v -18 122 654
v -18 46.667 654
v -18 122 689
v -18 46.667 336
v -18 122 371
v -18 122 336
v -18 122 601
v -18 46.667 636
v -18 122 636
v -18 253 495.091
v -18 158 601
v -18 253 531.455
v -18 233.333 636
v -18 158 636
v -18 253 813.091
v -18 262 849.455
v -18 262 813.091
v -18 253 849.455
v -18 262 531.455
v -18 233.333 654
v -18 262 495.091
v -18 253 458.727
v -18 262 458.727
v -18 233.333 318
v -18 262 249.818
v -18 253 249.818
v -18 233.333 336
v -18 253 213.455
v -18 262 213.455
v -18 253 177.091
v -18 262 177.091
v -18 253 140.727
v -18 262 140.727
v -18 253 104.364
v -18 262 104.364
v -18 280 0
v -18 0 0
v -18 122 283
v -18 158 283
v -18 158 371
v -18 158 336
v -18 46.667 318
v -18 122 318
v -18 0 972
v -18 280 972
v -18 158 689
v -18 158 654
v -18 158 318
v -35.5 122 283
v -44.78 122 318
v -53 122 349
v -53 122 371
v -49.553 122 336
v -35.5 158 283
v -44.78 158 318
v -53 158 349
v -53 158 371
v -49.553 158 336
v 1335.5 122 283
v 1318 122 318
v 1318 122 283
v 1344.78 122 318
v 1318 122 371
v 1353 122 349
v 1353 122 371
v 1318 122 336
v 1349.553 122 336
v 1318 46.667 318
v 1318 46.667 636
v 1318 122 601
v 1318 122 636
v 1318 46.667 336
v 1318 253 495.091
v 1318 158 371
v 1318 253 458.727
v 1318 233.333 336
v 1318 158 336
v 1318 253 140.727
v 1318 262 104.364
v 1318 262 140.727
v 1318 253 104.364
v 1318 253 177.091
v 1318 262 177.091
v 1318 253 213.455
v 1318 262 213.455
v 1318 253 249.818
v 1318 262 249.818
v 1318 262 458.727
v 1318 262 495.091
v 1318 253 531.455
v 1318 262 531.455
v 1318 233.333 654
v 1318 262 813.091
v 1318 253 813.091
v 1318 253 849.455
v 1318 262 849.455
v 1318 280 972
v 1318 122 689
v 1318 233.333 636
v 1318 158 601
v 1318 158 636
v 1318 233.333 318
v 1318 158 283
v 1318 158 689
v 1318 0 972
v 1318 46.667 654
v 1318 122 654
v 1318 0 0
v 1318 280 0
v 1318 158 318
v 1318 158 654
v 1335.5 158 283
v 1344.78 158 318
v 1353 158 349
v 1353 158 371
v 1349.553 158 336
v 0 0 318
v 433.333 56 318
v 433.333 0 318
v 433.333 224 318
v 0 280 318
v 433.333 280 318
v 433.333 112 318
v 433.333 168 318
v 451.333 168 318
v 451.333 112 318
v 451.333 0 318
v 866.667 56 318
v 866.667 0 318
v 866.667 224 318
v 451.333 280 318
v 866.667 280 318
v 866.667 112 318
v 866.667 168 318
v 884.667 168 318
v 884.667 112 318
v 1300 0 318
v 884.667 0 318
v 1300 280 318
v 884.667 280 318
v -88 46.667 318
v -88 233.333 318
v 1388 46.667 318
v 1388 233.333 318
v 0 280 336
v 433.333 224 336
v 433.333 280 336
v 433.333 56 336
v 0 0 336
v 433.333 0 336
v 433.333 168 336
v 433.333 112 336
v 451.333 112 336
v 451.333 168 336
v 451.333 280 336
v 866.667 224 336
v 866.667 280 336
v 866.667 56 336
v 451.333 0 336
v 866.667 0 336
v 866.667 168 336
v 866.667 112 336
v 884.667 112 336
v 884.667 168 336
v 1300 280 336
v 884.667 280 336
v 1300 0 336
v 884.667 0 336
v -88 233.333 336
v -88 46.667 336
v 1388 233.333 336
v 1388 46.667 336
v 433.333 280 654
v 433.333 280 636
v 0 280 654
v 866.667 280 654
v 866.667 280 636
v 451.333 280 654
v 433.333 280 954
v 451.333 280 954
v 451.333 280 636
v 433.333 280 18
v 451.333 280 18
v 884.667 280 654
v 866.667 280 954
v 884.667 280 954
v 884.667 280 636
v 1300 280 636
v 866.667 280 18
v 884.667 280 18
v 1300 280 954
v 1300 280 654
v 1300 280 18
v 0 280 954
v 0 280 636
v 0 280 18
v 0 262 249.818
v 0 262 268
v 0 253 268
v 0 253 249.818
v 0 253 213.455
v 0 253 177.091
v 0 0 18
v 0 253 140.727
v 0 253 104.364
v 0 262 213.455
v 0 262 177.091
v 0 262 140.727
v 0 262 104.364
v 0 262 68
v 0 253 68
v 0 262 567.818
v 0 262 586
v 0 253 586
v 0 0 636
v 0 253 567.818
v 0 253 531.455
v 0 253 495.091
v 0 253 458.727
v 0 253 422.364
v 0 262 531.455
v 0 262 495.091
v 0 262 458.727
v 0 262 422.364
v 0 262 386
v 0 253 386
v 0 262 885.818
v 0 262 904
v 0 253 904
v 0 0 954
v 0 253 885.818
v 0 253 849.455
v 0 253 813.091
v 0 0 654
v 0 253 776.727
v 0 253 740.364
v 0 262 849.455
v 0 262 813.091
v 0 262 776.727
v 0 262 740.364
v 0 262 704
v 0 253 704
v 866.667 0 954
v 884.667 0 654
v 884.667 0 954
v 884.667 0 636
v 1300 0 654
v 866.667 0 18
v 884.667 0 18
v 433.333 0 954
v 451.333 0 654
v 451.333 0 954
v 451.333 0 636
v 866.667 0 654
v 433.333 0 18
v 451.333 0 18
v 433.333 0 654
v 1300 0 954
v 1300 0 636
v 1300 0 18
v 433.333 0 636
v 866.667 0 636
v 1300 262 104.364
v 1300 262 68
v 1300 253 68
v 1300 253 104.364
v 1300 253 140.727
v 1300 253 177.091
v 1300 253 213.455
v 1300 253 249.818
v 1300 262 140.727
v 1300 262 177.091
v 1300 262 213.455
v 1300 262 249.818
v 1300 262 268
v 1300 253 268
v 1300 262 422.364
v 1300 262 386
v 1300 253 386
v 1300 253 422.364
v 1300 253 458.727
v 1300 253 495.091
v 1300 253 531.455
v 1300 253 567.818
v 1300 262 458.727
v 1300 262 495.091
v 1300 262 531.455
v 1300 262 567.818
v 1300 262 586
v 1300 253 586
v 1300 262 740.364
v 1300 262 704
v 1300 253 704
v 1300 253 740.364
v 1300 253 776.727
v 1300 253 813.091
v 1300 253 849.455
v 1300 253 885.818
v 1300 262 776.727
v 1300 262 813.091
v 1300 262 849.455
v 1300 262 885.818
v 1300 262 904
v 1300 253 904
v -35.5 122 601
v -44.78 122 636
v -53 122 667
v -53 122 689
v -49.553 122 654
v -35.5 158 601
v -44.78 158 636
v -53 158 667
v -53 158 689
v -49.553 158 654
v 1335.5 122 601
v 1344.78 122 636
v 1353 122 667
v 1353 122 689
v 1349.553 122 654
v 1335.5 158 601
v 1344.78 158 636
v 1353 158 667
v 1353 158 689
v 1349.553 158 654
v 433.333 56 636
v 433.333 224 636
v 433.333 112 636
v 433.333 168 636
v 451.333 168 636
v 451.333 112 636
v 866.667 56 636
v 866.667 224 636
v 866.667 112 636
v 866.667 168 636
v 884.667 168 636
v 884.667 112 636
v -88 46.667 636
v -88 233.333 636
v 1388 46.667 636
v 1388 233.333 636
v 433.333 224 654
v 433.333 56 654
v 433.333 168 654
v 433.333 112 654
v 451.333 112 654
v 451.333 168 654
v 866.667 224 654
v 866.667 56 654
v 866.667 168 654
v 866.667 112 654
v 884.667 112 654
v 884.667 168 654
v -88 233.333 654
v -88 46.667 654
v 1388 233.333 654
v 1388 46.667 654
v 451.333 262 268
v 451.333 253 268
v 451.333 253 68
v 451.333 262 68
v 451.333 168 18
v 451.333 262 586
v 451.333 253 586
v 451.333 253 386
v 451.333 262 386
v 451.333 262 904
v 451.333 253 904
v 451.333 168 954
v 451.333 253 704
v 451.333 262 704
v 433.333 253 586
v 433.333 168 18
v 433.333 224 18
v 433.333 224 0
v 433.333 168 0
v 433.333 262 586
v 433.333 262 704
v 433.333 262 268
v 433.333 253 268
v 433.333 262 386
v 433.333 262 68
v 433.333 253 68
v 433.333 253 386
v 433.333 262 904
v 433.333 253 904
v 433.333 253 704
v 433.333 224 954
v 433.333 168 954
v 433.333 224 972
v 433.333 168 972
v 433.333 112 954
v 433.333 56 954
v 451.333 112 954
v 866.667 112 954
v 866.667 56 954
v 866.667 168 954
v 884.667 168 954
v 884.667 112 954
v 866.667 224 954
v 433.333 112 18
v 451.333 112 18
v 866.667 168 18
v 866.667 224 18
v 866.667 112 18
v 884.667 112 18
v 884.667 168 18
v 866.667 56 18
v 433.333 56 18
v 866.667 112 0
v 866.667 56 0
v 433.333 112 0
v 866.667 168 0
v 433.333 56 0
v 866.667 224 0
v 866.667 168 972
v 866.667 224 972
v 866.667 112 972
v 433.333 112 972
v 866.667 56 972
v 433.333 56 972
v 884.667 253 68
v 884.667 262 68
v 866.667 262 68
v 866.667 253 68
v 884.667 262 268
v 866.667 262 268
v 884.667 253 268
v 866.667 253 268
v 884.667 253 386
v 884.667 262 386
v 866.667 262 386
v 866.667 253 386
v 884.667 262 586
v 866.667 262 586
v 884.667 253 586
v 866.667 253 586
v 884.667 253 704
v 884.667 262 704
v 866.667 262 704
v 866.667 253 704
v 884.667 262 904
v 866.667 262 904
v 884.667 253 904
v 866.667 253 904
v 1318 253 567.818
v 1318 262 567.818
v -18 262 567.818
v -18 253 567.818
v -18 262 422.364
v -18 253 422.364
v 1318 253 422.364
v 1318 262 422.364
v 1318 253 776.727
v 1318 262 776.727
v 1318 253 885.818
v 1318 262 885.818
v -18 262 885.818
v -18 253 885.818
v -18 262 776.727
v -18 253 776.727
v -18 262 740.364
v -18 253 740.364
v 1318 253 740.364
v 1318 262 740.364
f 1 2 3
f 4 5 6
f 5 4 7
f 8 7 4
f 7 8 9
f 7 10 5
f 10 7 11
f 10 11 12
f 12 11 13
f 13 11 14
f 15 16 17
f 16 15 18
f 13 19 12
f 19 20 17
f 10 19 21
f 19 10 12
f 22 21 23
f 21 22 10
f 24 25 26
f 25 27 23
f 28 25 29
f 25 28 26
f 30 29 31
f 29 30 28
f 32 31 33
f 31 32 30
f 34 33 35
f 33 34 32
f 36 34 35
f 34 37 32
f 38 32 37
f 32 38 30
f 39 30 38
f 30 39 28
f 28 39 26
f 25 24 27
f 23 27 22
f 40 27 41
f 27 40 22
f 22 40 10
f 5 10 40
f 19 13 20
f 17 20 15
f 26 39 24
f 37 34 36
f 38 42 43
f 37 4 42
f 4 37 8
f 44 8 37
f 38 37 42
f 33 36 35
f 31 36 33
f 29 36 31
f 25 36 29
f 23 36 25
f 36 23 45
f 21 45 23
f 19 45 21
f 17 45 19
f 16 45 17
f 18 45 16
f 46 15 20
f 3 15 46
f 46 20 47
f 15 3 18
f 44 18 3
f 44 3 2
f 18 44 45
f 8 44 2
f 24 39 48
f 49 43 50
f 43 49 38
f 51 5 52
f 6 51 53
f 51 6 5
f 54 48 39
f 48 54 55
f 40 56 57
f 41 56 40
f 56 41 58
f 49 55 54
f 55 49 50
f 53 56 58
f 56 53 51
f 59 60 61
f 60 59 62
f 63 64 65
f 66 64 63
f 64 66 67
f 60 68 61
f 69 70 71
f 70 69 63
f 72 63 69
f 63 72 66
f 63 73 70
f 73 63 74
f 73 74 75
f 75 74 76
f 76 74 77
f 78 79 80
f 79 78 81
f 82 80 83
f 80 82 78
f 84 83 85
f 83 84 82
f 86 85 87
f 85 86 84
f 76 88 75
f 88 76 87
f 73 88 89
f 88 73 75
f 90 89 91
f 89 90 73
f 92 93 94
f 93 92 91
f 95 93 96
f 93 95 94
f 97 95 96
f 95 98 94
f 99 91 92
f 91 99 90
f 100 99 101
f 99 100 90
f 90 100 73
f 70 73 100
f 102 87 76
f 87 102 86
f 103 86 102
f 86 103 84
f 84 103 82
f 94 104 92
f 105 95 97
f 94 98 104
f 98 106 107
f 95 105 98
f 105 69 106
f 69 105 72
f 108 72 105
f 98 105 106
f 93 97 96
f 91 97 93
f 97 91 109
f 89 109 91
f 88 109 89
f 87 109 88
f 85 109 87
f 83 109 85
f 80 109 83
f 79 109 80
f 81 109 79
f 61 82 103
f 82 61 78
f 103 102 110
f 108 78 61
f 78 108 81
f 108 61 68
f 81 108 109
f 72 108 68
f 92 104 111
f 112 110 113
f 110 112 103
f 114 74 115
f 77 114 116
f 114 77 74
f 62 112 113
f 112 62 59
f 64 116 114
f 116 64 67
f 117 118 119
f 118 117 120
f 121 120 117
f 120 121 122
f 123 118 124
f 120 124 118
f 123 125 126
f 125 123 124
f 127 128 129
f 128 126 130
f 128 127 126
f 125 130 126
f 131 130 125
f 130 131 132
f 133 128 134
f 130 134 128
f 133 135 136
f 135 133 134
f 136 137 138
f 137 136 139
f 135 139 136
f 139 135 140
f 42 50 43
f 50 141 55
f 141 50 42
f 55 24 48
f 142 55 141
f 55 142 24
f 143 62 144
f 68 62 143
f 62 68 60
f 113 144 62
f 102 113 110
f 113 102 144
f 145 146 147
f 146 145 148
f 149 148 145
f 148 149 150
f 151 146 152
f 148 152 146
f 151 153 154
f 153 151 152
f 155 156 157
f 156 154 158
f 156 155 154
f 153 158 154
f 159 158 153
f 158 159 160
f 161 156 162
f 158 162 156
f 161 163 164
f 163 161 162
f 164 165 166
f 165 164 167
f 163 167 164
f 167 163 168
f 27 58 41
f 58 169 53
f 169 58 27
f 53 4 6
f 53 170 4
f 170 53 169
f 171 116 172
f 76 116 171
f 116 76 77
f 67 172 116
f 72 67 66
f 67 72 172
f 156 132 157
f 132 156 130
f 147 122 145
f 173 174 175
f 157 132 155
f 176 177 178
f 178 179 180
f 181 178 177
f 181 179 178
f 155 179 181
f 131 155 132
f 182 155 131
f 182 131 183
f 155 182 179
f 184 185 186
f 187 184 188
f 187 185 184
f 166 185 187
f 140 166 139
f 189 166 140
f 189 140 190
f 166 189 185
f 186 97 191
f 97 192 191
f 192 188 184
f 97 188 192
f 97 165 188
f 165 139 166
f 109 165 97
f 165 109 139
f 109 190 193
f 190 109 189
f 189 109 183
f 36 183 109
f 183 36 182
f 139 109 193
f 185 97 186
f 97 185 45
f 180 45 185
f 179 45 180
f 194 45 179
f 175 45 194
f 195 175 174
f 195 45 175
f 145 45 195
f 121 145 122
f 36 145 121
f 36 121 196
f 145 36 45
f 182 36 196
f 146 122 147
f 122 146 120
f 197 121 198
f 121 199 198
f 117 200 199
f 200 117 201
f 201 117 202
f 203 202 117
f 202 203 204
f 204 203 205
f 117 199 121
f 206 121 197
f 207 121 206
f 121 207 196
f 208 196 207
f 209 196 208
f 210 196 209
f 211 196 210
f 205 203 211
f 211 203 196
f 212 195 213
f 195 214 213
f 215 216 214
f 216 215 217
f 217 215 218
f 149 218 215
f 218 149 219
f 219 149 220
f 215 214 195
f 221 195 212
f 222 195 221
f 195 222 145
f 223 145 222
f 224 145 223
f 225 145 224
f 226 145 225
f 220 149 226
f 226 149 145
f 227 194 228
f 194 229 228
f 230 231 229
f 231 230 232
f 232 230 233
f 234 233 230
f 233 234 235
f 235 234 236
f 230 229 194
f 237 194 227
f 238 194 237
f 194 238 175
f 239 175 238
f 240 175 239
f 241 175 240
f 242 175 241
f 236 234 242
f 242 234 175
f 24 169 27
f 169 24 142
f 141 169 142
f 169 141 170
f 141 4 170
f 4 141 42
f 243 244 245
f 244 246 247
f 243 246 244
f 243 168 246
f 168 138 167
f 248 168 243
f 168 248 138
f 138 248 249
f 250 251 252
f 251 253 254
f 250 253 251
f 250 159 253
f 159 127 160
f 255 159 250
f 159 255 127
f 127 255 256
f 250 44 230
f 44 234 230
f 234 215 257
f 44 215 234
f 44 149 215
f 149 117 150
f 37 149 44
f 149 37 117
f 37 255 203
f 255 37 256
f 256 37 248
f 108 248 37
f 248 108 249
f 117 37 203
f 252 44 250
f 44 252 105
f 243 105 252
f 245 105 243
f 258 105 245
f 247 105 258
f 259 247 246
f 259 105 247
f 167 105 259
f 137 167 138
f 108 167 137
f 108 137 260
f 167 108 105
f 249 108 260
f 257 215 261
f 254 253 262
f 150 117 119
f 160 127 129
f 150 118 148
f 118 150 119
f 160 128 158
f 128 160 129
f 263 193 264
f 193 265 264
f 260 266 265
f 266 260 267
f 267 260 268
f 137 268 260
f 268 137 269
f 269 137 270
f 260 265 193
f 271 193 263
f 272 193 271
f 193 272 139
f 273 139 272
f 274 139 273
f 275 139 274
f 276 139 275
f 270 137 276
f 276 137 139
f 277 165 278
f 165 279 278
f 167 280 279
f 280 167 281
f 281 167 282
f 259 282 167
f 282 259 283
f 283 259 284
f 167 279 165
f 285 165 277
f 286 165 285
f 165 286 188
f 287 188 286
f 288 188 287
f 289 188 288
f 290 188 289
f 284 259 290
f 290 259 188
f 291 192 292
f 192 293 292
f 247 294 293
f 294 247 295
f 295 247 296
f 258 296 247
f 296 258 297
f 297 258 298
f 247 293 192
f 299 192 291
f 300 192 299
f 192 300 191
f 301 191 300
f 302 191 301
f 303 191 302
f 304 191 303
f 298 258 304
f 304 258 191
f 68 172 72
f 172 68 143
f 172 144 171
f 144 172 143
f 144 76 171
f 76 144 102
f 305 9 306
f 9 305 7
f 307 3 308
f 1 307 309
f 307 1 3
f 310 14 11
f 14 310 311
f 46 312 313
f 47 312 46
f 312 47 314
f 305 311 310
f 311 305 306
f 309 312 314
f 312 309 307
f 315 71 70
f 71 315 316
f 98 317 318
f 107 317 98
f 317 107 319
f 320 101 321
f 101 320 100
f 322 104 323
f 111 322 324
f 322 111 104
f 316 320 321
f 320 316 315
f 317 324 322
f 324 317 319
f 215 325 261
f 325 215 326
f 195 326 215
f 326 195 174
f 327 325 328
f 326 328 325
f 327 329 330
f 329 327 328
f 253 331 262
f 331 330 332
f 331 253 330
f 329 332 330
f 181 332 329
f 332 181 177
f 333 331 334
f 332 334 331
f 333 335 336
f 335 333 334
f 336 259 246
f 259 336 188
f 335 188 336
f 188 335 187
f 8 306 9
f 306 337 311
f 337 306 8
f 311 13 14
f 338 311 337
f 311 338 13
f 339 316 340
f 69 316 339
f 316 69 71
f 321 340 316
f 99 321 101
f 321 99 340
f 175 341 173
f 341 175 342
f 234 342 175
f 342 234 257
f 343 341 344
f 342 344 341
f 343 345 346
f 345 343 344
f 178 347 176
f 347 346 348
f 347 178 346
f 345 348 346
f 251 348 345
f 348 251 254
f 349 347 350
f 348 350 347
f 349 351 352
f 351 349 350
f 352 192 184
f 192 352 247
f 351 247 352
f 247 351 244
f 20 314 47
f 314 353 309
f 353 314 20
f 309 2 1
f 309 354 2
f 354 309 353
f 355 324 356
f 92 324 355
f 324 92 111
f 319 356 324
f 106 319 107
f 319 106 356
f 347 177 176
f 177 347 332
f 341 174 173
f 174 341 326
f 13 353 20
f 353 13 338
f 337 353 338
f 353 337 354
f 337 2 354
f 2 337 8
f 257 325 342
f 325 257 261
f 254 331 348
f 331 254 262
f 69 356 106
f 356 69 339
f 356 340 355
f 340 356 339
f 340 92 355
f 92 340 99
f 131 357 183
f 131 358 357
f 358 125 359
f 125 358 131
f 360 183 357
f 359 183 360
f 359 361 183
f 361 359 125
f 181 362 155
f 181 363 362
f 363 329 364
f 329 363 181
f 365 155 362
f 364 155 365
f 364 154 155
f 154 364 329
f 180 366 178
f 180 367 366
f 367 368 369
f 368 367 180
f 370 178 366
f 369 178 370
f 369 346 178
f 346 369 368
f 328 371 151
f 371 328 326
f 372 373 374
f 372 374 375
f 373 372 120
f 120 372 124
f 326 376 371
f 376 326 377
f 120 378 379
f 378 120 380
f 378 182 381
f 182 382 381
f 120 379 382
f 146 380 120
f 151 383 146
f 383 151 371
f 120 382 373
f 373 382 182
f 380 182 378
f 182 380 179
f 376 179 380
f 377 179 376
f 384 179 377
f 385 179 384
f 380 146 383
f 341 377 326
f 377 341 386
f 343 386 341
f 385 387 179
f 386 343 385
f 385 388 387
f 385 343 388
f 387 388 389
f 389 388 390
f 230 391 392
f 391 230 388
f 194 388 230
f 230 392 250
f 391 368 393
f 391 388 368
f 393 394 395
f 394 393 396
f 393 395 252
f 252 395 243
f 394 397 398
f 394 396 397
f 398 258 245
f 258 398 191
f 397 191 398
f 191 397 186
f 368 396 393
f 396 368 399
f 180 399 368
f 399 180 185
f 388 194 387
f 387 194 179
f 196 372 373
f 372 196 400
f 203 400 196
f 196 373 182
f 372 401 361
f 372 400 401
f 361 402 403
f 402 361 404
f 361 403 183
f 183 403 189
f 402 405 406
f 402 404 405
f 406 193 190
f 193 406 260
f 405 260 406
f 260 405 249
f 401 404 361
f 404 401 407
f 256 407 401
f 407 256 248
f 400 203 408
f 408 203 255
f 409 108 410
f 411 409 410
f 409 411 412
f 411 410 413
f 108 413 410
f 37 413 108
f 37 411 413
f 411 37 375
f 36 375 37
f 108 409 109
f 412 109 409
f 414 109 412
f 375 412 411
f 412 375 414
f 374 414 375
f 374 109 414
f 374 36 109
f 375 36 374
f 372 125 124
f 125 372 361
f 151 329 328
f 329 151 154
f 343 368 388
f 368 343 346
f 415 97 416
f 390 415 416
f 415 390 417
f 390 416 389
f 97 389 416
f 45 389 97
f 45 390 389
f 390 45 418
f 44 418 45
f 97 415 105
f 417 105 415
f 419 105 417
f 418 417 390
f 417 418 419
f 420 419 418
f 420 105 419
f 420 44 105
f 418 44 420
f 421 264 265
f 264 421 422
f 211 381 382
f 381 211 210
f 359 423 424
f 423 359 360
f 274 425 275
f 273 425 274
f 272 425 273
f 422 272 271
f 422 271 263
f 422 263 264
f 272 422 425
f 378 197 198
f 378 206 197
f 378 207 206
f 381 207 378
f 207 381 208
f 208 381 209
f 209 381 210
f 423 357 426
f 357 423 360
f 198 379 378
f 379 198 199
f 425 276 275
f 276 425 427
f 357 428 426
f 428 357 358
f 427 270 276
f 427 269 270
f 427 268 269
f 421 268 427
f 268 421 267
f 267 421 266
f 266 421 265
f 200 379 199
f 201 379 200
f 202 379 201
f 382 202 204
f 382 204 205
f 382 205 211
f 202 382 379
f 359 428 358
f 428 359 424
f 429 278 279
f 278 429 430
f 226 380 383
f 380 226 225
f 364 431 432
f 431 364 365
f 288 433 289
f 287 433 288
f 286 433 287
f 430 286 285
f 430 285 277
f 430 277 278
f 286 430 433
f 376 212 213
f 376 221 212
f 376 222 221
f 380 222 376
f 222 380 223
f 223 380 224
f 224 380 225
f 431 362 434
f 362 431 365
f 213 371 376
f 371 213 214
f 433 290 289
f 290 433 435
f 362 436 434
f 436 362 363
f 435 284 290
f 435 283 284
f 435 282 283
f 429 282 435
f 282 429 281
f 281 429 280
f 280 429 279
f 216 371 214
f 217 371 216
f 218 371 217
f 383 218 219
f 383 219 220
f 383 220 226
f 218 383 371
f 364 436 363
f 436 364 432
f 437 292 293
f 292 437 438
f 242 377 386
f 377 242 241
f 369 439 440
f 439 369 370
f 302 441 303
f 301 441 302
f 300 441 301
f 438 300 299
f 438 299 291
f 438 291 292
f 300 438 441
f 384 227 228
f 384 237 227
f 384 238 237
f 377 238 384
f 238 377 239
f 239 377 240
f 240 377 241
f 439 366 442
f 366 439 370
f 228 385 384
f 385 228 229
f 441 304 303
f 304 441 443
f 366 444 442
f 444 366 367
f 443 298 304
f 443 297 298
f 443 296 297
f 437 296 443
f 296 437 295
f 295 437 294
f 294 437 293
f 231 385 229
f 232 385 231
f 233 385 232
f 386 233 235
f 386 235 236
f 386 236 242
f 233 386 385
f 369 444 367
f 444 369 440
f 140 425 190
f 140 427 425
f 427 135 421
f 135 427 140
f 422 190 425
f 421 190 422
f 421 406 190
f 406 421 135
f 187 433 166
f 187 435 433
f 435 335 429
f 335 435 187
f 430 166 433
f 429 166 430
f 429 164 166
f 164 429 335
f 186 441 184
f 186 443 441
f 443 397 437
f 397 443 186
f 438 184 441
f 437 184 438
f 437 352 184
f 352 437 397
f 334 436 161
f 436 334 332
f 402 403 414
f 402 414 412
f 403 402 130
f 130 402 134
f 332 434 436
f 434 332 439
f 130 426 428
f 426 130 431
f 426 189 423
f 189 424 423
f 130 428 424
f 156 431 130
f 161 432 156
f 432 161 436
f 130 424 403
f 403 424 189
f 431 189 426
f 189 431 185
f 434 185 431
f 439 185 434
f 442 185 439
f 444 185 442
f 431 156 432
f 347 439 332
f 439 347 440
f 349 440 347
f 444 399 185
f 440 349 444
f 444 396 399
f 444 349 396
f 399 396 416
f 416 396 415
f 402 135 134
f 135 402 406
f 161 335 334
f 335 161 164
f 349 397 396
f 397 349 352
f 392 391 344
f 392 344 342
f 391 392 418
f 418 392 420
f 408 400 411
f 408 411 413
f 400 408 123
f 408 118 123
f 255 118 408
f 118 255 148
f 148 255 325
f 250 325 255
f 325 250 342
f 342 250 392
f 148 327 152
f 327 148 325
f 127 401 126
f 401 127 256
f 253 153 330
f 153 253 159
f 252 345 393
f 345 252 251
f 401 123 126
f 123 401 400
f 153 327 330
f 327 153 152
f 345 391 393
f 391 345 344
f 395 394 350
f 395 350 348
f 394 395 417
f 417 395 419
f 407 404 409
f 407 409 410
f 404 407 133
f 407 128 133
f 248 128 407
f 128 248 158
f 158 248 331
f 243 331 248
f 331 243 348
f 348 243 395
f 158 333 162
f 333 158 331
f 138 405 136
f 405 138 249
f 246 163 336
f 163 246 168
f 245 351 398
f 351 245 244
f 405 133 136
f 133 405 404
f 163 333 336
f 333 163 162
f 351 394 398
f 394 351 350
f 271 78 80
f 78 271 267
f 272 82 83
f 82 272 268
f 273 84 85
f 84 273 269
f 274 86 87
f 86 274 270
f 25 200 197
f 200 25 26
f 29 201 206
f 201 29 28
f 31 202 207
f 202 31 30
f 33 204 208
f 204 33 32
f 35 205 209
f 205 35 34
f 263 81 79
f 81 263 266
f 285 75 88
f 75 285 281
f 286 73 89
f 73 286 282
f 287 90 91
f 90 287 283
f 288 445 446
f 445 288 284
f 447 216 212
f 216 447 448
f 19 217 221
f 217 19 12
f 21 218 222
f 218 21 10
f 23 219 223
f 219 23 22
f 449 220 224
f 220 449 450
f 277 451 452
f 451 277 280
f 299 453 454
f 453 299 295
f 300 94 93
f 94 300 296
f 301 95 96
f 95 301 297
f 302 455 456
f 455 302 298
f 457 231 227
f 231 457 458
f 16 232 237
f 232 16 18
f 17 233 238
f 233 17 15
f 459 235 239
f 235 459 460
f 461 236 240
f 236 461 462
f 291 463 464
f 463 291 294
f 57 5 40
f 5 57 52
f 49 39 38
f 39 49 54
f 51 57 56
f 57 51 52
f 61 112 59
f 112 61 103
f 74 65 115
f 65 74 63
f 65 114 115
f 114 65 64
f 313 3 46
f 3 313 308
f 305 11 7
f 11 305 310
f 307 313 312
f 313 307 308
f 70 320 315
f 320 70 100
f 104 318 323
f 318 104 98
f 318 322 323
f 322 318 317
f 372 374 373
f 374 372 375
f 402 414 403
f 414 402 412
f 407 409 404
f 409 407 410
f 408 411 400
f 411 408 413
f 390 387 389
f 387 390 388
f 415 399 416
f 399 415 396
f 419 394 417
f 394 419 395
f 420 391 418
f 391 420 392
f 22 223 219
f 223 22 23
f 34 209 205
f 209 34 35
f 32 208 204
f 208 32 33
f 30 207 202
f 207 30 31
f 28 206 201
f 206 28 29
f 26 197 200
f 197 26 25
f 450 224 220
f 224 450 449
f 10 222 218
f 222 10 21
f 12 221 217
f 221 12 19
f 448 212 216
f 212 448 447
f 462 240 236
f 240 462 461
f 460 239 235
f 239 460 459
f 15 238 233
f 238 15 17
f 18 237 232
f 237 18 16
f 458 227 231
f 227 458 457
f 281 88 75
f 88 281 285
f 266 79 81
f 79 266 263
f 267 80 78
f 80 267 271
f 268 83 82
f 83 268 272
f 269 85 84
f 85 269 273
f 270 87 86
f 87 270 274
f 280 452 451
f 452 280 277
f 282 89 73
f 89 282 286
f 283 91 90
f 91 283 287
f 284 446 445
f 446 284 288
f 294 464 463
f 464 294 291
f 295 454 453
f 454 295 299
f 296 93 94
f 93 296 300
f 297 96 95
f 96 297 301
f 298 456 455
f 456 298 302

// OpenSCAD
// TODO:
// - back holder as male slot for the vertical sides
// - more milling in the angles
// - back holders holes must be more distant to the other holes (too fragile)
// - 2d projection is wrong for the nail (diagonally pierced)

/* [Dimensions] */

// Structure base width, does NOT include the "nailed tongues" (side holders)
base_width = 1300; // [300:2000]

// Maximum depth of the structure
base_depth = 280; // [200:500]

// Thickness of most of the planks
base_thickness = 18; // [10:1:50]

// Thickness of the back holders planks
back_holders_thickness = 9; // [5:1:50]

// Actual free space available at each floor (height)
floor_space = 300; // [100:500]

// Visible extra width of the nailed tongues
hold_extra_width = 70; // [50:100]

/* [Layout] */

// Number of floors, not including the bottom and top one
nb_floors = 2; // [1:5]

// Number of columns, not including the top-left and top-right vertical sides
nb_cols = 2; // [1:5]

/* [Export/Preview] */

piece = "all";

// Show all parts individually
show_parts = false;

// Project parts in 2D (for DXF export typically); needs show_parts to be enabled
project_2d = true;

// Enable animation of the build; needs show_parts to be disabled
animated = false;

/* [Colors] */
// Color for vertical planks
c0 = "#a3917fff";

// Color for horizontal planks
c1 = "#856363ff";

// Color for back holders
c2 = "#8a7875ff";

// Color for nails
c3 = "#564538ff";

extra_w = base_thickness + hold_extra_width;
floor_extra_d = 2 * base_depth / 3;

extra_pad = (base_depth - floor_extra_d) / 2;

cols_height = (nb_floors + 1) * floor_space + (nb_floors + 2) * base_thickness;

full_width  = base_width + 2 * extra_w;
full_height = cols_height;
full_depth  = base_depth;

/* the nail is composed of the 2 extra left-over of each h-plank side cuts stuck together */
nail_width = base_thickness * 2;

/* default size would be too large so we cut them out */
nail_depth = hold_extra_width / 2;
nail_height = extra_w;

mid_plank_depth = 2 * base_depth / 5;

slice_depth = base_depth / 5;

back_holders_height    = 2 * floor_space / 3;
back_holders_length    = base_width + 2 * base_thickness;
back_holders_backpad   = base_thickness;

h_plank_width      = base_width;
h_plank_depth      = base_depth;
h_plank_height     = base_thickness;
h_plank_extra_w    = extra_w;
h_plank_extra_d    = floor_extra_d;

function column_pos(i) = base_width * i / (nb_cols + 1);
function floor_pos(i) = (base_thickness + floor_space) * i;
function back_holder_pos(i) = floor_pos(i) + base_thickness + (floor_space - back_holders_height) / 2;

function segment_size(min_size, length) = length / (2 * min_size) - 1 / 2;

// TODO: dovetail
module milling(w_hint, depth, length, swap=false) {

    // get the number of segments possible with that first approximate
    tot_seg_count_tmp = max(floor(length / w_hint), 3);

    // make sure we have a odd number of segment (so that we can have 2 extremities and 1 space at minimum)
    tot_seg_count = tot_seg_count_tmp - (tot_seg_count_tmp % 2 ? 0 : 1);

    // 1 less female slot that the number of male slots
    fem_seg_count = (tot_seg_count - 1) / 2;
    mal_seg_count = fem_seg_count + 1;
    assert(mal_seg_count == tot_seg_count - fem_seg_count);

    // now compute the adjusted length of the segments
    w_pick = length / tot_seg_count;
    assert(w_pick >= w_hint);

    if (swap)
        for (i = [0:fem_seg_count - 1])
            translate([0, w_pick * (i * 2 + 1)])
                square([depth, w_pick]);
    else
        for (i = [0:mal_seg_count - 1])
            translate([0, w_pick * i * 2])
                square([depth, w_pick]);
}

module h_plank_mid() {
    echo(str("horizontal middle plank: ", h_plank_width + 2 * h_plank_extra_w, "x", h_plank_depth, "x", h_plank_height));

    difference() {

        /* base h-plank*/
        linear_extrude(height=h_plank_height, convexity=2) {
            /* the 2 extra sides */
            translate([-h_plank_extra_w, extra_pad]) square([h_plank_extra_w, h_plank_extra_d]);
            translate([   h_plank_width, extra_pad]) square([h_plank_extra_w, h_plank_extra_d]);

            difference() {
                /* main plank center */
                square([h_plank_width, h_plank_depth]);

                /* mid plank slices */
                for (i = [1:nb_cols]) {
                    translate([column_pos(i), 0])                           square([base_thickness, slice_depth]);
                    translate([column_pos(i), h_plank_depth - slice_depth]) square([base_thickness, slice_depth]);
                }
            }
        }

        /* nail holes */
        translate([0, 0, -(nail_height - base_thickness) / 2]) {
            translate([-base_thickness, (h_plank_depth + nail_width) / 2])
                rotate([0, 0, 180])
                    nail();
            translate([h_plank_width + base_thickness, (h_plank_depth - nail_width) / 2])
                nail();
        }
    }
}

/* top and bottom horizontal planks */
module h_plank_tb() {
    echo(str("horizontal top/bottom plank: ", h_plank_width, "x", h_plank_depth, "x", h_plank_height));

    linear_extrude(height=h_plank_height, convexity=2) {
        difference() {
            /* main plank center */
            square([h_plank_width, h_plank_depth]);

            /* mid plank slices */
            for (i = [1:nb_cols]) {
                translate([column_pos(i), slice_depth])                   square([base_thickness, slice_depth]);
                translate([column_pos(i), h_plank_depth - slice_depth*2]) square([base_thickness, slice_depth]);
            }
        }

        /* joints with vertical sides */
        translate([-v_plank_lr_height, 0])
            milling(v_plank_lr_height, v_plank_lr_height, h_plank_depth);
        translate([h_plank_width, 0])
            milling(v_plank_lr_height, v_plank_lr_height, h_plank_depth);
    }
}

v_plank_mid_front_width = cols_height;
v_plank_mid_front_depth = mid_plank_depth;
v_plank_mid_front_height = base_thickness;

module v_plank_mid_front() {
    echo(str("vertical middle plank (front): ", v_plank_mid_front_width, "x", v_plank_mid_front_depth, "x", v_plank_mid_front_height));

    linear_extrude(height=v_plank_mid_front_height, convexity=2) {
        difference() {
            square([v_plank_mid_front_width, v_plank_mid_front_depth]);

            /* top and bottom extremities */
            translate([0, v_plank_mid_back_depth - slice_depth, 0])
                square([base_thickness, slice_depth]);
            translate([v_plank_mid_back_width - base_thickness, v_plank_mid_back_depth - slice_depth, 0])
                square([base_thickness, slice_depth]);

            /* floor slices */
            for (i = [1:nb_floors])
                translate([floor_pos(i), 0])
                    square([base_thickness, slice_depth]);
        }
    }
}

v_plank_mid_back_width = cols_height;
v_plank_mid_back_depth = mid_plank_depth;
v_plank_mid_back_height = base_thickness;

module v_plank_mid_back() {
    echo(str("vertical middle plank (back): ", v_plank_mid_back_width, "x", v_plank_mid_back_depth, "x", v_plank_mid_back_height));

    linear_extrude(height=v_plank_mid_back_height, convexity=2) {
        difference() {
            square([v_plank_mid_back_width, v_plank_mid_back_depth]);

            /* top and bottom extremities */
            translate([0, v_plank_mid_back_depth - slice_depth, 0])
                square([base_thickness, slice_depth]);
            translate([v_plank_mid_back_width - base_thickness, v_plank_mid_back_depth - slice_depth, 0])
                square([base_thickness, slice_depth]);

            /* floor slices */
            for (i = [1:nb_floors])
                translate([floor_pos(i), 0])
                    square([base_thickness, slice_depth]);

            /* back holder holes */
            for (i = [0:nb_floors])
                translate([back_holder_pos(i), v_plank_mid_back_depth - back_holders_thickness - back_holders_backpad])
                    square([back_holders_height, back_holders_thickness]);
        }
    }
}

v_plank_lr_width = cols_height;
v_plank_lr_depth = base_depth;
v_plank_lr_height = base_thickness;

module v_plank_lr(width=cols_height, depth=base_depth, v_plank_lr_height=base_thickness) {
    echo(str("vertical left/right plank: ", v_plank_lr_width, "x", v_plank_lr_depth, "x", v_plank_lr_height));

    linear_extrude(height=v_plank_lr_height, convexity=2) {
        difference() {
            translate([h_plank_height, 0])
                square([v_plank_lr_width - h_plank_height * 2, v_plank_lr_depth]);

            /* floor holes */
            for (i = [1:nb_floors])
                translate([floor_pos(i), (v_plank_lr_depth - floor_extra_d) / 2])
                    square([base_thickness, floor_extra_d]);

            /* back holder holes */
            for (i = [0:nb_floors])
                translate([back_holder_pos(i) + back_holders_height, base_depth - back_holders_thickness - back_holders_backpad])
                    rotate([0, 0, 90])
                        milling(v_plank_lr_height, back_holders_thickness, back_holders_height, swap=true);
        }

        /* top and bottom millings */
        milling(v_plank_lr_height, v_plank_lr_height, h_plank_depth, swap=true);
        translate([v_plank_lr_width - v_plank_lr_height, 0])
            milling(v_plank_lr_height, v_plank_lr_height, h_plank_depth, swap=true);
    }
}

module nail(width=nail_width, depth=nail_depth, height=nail_height) {
    rotate([0, -90, -90])
    linear_extrude(height=width, convexity=2)
        polygon([[0, 0], [height, 0], [height, depth], [3*height/4, depth], [0, depth/2]]);
}

module back_holder() {
    echo(str("back holder: ", back_holders_length, "x", back_holders_height, "x", back_holders_thickness));
    linear_extrude(height=back_holders_thickness, convexity=2) {
        translate([v_plank_lr_height, 0])
            square([back_holders_length - v_plank_lr_height * 2, back_holders_height]);

        /* extremities */
        milling(v_plank_lr_height, v_plank_lr_height, back_holders_height, swap=true);
        translate([back_holders_length - v_plank_lr_height, 0])
            milling(v_plank_lr_height, v_plank_lr_height, back_holders_height, swap=true);
    }
}

function mix(x, y, a) = x * (1 - a) + y * a;
function linear(x) = x;
function cubic(x) = x*x*x;
function cubic_out(x) = 1-cubic(1-x);
function cubic_in_out(x) = x < 1/2 ? 2*cubic(x)/2 : 1 - cubic(2*(1-x))/2;
function scaled_time(t, start, end) = min(max((t - start) / (end - start), 0), 1);

module animate(time, from, to=[0, 0, 0], start_time=0, end_time=1) {
    if (time >= start_time) {
        translate(mix(from, to, cubic_out(scaled_time(time, start_time, end_time))))
            children();
    }
}

module time_sequence(time, vectors) {
    if (!animated) {
        children();
    } else {
        assert($children == len(vectors));
        for (i = [0:$children-1]) {
            start_time = i / ($children + 1);
            end_time = (i + 1) / ($children + 1);
            animate(time, from=vectors[i], start_time=start_time, end_time=end_time)
                children(i);
        }
    }
}

module main() {

    voff = 400;

    time_sequence(time=$t, vectors=[
       [-voff, 0, 0],   // floors
       [0, voff, 0],    // mid planks (back)
       [0, -voff, 0],   // mid planks (front)
       [0, 0, -voff/2], // bottom
       [0, 0, voff/2],  // top
       [-voff - back_holders_length, 0, 0],
       [-voff, 0, 0],   // left side plank
       [voff, 0, 0],    // right side plank
       [0, 0, 100],     // nails
    ]) {

        /* floors */
        color(c1)
            for (i = [1:nb_floors])
                translate([0, 0, floor_pos(i)])
                    h_plank_mid();

        /* vertical mid planks (back) */
        color(c0)
            for (i = [1:nb_cols])
                rotate([0, -90, 0])
                    translate([0, base_depth - mid_plank_depth, -column_pos(i)-base_thickness])
                        v_plank_mid_back();

        /* vertical mid planks (front) */
        color(c0)
            for (i = [1:nb_cols])
                rotate([0, -90, 180])
                    translate([0, -mid_plank_depth, column_pos(i)])
                        v_plank_mid_front();

        /* bottom */
        color(c1)
            h_plank_tb();

        /* top */
        color(c1)
            translate([0, 0, cols_height - base_thickness])
                h_plank_tb();


        /* back holders */
        color(c2)
            for (i = [0:nb_floors])
                translate([-base_thickness, base_depth - back_holders_backpad, back_holder_pos(i)])
                    rotate([90, 0, 0])
                        back_holder();

        /* vertical side planks (left and right) */
        color(c0)
            rotate([0, -90, 0])
                v_plank_lr();

        color(c0) {
            rotate([0, -90, 0]) {
                translate([0, 0, -base_width - base_thickness])
                    v_plank_lr();
            }
        }

        /* nails */
        color(c3) {
            for (i = [1:nb_floors]) {
                translate([0, 0, floor_pos(i) - (nail_height - base_thickness) / 2]) {
                    translate([-base_thickness, (base_depth+nail_width)/2])
                        rotate([0, 0, 180])
                            nail();
                    translate([base_width + base_thickness, (base_depth-nail_width)/2])
                        nail();
                }
            }
        }
    }
}

module do_show_parts() {
    if      (piece == "h_plank_mid")       h_plank_mid();
    else if (piece == "h_plank_tb")        h_plank_tb();
    else if (piece == "v_plank_lr")        v_plank_lr();
    else if (piece == "v_plank_mid_back")  v_plank_mid_back();
    else if (piece == "v_plank_mid_front") v_plank_mid_front();
    else if (piece == "back_holder")       back_holder();
    else {
        pad = 40;
        h_plank_mid();
        translate([0, pad*1 + h_plank_depth])
            h_plank_tb();
        translate([0, pad*2 + h_plank_depth*2])
            v_plank_lr();
        translate([0, pad*3 + h_plank_depth*2 + v_plank_lr_depth])
            v_plank_mid_back();
        translate([0, pad*4 + h_plank_depth*2 + v_plank_lr_depth + v_plank_mid_back_depth])
            v_plank_mid_front();
        translate([0, pad*5 + h_plank_depth*2 + v_plank_lr_depth + v_plank_mid_back_depth + v_plank_mid_front_depth])
            back_holder();

        //nail();
    }
}

if (show_parts) {
    if (project_2d) {
        projection()
            do_show_parts();
    } else {
        do_show_parts();
    }
} else {
    main();
}

echo(dimensions=[full_width, full_height, full_depth]);
